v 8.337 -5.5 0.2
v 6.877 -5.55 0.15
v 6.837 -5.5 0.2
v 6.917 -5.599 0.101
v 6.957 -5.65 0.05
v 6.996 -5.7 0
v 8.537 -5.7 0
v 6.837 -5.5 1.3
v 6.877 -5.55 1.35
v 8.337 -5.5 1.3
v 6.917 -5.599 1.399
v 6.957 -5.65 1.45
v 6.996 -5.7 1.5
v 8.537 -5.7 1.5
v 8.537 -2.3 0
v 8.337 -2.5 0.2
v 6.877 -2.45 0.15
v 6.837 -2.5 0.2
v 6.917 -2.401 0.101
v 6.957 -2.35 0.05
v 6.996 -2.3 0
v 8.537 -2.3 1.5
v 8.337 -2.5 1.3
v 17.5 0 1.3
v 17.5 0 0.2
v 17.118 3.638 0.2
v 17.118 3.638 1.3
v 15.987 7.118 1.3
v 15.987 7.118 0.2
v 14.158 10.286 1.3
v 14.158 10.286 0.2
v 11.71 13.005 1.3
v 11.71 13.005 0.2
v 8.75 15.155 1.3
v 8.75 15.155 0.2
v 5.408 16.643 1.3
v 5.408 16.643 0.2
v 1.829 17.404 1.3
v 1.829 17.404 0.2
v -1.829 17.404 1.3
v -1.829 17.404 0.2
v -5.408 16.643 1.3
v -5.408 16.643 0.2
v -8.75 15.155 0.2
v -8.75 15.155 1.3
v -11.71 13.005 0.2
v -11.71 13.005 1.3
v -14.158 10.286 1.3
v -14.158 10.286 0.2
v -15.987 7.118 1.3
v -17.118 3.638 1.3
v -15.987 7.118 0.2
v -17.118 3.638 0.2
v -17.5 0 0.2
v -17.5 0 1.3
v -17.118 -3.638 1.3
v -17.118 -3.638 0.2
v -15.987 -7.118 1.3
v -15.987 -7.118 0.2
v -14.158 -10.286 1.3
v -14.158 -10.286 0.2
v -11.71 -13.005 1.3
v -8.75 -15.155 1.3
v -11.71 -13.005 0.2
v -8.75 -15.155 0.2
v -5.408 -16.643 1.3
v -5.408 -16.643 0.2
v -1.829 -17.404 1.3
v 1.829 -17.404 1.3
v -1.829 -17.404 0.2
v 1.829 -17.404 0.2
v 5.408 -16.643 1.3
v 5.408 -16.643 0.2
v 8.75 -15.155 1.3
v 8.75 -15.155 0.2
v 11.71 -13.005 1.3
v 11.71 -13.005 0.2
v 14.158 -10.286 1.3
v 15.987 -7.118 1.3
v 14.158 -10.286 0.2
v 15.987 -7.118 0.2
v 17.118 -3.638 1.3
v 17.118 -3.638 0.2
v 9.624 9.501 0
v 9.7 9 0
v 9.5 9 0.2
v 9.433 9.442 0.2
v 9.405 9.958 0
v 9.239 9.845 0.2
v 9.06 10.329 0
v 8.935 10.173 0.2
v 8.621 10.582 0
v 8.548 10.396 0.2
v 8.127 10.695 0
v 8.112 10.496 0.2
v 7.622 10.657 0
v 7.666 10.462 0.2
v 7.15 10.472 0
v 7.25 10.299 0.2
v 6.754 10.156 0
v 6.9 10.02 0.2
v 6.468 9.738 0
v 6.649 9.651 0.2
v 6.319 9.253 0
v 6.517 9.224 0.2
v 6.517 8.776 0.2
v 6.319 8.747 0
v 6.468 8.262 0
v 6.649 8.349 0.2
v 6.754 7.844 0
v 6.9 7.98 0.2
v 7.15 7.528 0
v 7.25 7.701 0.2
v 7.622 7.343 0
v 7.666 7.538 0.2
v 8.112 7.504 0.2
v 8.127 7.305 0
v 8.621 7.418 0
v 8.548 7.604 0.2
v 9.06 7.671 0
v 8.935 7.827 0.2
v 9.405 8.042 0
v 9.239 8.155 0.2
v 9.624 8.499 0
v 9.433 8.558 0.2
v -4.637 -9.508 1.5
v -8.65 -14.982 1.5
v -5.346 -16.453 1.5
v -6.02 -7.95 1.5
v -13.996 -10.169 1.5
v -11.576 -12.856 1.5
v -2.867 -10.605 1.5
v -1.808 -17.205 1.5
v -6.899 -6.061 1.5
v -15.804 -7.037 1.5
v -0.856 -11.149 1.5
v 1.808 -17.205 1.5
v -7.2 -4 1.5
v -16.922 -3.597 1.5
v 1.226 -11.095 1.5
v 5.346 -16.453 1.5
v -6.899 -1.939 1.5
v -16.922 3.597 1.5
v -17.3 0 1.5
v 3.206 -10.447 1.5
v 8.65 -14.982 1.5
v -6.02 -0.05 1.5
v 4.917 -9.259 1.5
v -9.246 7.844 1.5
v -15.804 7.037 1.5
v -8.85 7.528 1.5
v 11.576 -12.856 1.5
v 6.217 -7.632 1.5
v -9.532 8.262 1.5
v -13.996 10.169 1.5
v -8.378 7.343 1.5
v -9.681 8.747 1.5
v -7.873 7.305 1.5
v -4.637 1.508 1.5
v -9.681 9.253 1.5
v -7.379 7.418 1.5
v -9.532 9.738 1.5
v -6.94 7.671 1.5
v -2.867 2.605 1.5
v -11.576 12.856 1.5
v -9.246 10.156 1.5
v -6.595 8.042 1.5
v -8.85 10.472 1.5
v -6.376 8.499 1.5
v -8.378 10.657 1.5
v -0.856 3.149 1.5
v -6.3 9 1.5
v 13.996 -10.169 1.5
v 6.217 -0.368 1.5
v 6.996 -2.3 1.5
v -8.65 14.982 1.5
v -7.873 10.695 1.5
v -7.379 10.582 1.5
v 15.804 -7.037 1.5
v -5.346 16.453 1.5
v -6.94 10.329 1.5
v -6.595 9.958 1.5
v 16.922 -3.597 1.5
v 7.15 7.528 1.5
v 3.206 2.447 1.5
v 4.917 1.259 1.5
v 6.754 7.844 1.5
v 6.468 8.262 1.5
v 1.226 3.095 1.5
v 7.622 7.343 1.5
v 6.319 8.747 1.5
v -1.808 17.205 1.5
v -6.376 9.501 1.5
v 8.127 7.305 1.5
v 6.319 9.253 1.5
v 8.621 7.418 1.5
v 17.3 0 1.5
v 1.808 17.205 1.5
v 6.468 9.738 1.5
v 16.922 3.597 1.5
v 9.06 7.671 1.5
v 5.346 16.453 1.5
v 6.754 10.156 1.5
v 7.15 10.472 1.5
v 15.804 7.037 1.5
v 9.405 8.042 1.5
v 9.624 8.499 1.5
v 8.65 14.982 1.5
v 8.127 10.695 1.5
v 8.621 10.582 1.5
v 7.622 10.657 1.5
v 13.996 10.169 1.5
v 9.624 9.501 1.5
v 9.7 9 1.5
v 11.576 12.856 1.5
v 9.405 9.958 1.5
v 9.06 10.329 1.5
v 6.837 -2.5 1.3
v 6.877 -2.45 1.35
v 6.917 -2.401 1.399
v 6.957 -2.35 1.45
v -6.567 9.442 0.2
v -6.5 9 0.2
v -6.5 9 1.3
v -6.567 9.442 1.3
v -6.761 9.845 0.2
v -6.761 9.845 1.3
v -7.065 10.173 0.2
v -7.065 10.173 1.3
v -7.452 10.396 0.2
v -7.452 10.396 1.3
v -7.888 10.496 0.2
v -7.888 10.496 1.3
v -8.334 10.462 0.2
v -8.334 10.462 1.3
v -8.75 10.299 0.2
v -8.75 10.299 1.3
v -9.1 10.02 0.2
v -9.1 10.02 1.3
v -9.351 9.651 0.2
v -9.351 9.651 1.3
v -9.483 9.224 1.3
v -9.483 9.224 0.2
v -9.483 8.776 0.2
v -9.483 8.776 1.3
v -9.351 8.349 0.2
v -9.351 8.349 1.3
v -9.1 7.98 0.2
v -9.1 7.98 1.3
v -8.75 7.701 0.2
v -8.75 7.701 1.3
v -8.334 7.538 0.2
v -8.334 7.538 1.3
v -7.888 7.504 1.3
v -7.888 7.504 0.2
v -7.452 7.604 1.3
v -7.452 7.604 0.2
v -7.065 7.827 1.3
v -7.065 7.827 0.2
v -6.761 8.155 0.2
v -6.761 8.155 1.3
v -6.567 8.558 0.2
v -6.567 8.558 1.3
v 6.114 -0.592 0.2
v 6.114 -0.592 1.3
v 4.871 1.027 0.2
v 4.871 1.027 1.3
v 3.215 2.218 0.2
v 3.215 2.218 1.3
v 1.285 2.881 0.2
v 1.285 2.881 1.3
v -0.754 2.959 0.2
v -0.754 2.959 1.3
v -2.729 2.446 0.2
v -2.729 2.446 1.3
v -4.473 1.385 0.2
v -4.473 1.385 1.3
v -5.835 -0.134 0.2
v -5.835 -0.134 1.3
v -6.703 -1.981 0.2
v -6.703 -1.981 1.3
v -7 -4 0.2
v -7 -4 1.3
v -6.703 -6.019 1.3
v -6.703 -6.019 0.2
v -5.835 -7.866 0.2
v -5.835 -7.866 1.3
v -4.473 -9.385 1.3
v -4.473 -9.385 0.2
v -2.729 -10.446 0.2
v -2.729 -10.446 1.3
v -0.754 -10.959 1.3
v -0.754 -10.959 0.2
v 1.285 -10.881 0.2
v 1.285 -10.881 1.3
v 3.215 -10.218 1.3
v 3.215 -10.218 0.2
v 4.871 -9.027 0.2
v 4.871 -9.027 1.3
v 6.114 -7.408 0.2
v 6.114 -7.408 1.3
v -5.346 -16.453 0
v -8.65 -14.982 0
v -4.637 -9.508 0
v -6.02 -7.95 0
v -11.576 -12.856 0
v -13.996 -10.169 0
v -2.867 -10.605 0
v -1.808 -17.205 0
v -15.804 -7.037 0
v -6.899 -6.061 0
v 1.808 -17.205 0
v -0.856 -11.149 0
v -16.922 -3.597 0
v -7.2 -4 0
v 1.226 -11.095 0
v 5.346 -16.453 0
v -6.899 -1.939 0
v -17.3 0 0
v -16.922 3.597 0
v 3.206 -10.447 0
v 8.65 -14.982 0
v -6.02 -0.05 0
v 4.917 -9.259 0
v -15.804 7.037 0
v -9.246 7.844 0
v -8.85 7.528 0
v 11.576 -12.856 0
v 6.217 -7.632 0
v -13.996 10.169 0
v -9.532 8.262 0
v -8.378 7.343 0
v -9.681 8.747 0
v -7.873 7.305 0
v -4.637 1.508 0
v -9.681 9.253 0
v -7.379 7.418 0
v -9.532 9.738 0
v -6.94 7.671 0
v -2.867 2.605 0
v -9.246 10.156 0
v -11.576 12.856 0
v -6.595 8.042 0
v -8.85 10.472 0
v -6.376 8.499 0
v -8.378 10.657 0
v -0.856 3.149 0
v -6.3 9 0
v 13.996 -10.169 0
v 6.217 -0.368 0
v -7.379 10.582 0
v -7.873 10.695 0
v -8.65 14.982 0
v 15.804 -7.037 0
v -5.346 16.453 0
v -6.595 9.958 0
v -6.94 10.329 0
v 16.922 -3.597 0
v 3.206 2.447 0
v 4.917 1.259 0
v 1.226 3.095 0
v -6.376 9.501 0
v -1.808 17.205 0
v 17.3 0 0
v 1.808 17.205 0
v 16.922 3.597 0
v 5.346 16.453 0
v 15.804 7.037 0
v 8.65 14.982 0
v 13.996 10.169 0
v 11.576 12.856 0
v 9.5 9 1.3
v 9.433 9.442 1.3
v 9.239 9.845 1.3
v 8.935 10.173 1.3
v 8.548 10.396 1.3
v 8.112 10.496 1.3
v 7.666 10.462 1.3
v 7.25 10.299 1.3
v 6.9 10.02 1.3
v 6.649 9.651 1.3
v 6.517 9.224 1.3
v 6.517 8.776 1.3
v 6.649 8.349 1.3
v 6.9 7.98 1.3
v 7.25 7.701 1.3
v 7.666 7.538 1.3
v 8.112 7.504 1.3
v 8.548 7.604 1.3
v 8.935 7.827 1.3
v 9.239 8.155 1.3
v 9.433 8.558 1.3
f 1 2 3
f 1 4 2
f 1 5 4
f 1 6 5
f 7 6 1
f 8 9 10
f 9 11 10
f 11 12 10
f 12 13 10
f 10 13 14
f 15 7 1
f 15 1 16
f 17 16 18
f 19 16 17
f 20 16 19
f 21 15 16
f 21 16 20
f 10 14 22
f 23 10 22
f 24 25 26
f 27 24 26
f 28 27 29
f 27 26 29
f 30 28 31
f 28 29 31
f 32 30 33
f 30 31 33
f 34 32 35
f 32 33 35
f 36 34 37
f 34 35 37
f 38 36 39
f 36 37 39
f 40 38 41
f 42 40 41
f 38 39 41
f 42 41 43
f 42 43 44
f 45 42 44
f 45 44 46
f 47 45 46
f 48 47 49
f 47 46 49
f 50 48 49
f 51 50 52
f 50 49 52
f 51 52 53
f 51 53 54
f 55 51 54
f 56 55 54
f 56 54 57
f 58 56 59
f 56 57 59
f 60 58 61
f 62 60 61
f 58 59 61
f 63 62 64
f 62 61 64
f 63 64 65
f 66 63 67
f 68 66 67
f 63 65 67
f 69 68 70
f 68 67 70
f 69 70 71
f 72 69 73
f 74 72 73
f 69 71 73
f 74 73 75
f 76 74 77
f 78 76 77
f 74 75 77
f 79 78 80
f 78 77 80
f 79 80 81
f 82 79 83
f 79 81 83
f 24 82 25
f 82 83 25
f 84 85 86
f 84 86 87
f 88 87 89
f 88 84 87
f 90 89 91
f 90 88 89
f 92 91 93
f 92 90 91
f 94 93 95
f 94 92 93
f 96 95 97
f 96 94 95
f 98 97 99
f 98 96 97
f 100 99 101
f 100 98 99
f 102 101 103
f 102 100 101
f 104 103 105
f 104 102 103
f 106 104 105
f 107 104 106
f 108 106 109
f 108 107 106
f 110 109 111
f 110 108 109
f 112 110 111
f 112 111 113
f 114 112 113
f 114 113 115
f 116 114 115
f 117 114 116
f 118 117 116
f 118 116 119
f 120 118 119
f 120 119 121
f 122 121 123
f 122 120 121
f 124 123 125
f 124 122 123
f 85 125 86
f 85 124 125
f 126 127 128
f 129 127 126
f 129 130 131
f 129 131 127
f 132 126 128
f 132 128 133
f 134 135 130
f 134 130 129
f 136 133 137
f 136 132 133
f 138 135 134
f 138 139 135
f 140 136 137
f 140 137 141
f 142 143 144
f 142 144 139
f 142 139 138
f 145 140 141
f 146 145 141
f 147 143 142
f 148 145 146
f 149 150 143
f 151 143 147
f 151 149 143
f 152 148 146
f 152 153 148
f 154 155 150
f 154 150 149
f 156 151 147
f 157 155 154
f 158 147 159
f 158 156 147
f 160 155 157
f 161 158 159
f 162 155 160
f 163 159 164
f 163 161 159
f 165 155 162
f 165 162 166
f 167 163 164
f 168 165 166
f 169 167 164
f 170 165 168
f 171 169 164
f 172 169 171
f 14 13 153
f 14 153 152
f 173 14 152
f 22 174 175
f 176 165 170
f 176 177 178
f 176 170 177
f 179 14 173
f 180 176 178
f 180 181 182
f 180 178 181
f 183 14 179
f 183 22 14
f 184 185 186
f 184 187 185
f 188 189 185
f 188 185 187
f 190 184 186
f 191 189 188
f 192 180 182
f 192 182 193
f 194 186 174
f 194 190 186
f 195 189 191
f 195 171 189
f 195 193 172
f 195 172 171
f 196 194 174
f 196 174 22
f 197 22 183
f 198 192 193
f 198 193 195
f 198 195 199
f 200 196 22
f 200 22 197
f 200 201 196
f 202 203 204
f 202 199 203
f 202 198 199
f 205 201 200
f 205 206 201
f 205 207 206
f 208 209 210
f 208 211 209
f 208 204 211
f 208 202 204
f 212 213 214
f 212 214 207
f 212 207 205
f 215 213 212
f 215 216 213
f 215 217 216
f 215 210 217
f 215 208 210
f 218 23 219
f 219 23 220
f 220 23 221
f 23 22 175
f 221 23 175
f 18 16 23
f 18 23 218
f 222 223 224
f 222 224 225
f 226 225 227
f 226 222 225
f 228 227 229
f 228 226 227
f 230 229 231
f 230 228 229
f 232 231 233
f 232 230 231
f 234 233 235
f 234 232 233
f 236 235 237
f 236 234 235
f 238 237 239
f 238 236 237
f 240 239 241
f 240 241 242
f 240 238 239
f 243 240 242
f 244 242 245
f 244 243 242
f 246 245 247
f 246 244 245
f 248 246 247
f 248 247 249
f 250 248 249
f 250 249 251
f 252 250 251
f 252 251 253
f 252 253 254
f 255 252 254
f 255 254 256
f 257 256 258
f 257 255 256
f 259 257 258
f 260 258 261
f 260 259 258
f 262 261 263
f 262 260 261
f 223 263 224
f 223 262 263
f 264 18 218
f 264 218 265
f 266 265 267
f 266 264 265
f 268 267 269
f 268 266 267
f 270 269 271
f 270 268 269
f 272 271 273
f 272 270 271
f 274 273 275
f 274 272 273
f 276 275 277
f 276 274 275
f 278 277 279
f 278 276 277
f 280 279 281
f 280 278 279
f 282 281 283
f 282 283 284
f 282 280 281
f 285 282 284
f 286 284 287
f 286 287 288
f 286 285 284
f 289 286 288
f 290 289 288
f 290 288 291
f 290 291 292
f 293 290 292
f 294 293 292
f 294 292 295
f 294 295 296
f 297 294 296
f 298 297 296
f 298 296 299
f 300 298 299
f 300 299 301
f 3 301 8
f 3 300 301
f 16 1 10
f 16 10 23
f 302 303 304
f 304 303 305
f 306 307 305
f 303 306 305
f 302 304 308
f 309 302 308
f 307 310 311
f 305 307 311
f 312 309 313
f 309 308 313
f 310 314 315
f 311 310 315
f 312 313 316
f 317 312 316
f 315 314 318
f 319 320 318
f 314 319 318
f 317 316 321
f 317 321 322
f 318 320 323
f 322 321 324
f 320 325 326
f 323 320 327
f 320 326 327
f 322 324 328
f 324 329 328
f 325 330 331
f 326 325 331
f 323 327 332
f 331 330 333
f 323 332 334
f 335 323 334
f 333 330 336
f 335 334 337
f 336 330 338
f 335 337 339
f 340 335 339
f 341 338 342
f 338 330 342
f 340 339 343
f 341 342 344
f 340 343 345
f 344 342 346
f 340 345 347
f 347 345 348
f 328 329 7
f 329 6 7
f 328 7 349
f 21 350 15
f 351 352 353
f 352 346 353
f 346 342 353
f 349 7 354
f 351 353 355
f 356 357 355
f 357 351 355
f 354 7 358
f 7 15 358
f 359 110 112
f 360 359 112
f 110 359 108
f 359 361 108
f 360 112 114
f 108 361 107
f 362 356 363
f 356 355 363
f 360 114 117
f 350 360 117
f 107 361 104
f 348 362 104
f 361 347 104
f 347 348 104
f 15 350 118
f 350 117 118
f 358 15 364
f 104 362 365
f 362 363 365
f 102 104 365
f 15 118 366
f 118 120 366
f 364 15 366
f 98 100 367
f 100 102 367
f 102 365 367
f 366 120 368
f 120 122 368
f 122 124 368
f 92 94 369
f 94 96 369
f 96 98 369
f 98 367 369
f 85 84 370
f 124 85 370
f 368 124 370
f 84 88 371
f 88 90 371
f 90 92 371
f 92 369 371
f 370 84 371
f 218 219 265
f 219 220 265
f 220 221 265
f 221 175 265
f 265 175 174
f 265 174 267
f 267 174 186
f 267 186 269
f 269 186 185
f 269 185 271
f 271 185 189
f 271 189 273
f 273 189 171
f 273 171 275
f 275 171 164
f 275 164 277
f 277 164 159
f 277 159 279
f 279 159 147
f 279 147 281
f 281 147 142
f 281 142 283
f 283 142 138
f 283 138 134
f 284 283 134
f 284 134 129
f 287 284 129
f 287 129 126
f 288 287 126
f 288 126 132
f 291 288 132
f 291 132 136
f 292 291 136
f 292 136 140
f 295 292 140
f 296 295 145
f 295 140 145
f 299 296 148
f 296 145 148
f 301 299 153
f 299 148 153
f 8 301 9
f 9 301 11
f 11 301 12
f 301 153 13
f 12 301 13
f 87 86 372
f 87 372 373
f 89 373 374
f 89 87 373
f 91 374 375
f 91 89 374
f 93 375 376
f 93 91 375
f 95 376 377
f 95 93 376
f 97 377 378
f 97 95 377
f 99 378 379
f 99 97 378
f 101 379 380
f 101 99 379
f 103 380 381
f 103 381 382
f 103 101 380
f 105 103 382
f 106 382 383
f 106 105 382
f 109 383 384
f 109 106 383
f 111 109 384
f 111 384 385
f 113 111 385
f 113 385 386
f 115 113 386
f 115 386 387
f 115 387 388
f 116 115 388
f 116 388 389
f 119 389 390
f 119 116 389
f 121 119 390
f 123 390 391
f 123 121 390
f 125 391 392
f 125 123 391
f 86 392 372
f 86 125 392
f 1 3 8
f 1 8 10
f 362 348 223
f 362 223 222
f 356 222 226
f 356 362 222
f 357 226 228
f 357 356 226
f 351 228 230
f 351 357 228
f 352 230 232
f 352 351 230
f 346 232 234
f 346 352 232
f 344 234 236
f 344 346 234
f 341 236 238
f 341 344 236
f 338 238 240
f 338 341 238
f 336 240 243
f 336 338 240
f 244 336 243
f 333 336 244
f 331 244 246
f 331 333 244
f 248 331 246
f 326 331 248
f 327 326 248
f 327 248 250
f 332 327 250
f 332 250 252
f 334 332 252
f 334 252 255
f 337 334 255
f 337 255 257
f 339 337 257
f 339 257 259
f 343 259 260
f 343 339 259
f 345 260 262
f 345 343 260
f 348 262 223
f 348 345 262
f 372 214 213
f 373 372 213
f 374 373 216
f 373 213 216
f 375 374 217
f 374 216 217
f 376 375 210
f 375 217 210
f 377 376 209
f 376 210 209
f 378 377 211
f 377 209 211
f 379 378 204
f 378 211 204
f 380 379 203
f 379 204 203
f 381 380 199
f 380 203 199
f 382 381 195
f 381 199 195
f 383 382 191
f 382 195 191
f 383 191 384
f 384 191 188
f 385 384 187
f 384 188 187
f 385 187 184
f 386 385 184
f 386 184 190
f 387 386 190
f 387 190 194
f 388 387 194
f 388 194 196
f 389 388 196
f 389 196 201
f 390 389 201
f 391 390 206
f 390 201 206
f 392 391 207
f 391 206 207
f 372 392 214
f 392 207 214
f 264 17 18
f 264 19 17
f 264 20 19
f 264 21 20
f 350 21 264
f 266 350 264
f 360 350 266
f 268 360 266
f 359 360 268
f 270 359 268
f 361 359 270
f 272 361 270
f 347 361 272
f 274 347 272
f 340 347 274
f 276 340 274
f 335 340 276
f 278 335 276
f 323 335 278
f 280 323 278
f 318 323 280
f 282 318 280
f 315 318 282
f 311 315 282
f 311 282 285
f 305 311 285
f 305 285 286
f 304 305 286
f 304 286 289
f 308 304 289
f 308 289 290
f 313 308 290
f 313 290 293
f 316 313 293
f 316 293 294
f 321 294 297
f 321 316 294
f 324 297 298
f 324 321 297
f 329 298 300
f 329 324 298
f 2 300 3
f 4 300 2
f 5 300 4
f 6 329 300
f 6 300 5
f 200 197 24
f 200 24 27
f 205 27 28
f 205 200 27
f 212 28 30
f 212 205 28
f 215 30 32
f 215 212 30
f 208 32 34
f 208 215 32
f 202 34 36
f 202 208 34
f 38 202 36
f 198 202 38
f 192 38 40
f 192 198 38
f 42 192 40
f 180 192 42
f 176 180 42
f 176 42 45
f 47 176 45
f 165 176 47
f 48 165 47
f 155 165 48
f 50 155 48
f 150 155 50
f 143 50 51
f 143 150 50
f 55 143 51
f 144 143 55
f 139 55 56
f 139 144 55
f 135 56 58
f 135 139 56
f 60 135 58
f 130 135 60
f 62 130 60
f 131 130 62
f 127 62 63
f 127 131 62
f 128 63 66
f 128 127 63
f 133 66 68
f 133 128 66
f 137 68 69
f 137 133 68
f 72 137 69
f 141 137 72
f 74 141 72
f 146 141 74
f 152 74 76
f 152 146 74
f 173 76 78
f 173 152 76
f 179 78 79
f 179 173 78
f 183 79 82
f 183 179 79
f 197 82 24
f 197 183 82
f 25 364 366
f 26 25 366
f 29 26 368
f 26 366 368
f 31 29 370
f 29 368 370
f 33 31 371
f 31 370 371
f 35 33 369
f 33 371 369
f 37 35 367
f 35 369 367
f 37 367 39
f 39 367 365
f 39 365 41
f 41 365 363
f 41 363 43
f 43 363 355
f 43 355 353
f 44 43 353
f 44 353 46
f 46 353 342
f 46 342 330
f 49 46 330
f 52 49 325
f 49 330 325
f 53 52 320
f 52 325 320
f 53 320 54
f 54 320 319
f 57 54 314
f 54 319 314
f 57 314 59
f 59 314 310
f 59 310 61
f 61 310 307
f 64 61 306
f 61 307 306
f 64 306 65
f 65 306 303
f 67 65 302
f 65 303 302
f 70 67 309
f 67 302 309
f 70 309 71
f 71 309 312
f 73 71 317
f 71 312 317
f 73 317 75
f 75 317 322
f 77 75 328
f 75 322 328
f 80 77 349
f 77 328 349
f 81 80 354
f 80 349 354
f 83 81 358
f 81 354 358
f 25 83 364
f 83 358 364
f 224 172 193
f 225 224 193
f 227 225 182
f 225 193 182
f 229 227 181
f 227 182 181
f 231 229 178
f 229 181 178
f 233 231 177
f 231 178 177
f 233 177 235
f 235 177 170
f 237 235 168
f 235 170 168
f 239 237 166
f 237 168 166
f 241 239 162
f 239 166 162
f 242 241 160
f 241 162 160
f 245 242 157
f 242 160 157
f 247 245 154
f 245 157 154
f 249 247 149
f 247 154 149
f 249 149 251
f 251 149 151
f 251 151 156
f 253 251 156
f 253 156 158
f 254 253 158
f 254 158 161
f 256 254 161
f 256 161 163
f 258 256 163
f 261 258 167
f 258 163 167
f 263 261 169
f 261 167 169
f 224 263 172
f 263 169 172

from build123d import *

# Parameters (mm, degrees)
SKETCH1_R           = 17.5
SKETCH1_R_2         = 1.5
BOSS_EXTRUDE1_DEPTH = 1.5
CHAMFER1_SIZE       = 0.2


with BuildPart() as part:
    # Sketch1 → Boss-Extrude1 (new body)
    with BuildSketch(Plane.XY):
        Circle(SKETCH1_R)
        with Locations((-8, 9)):
            Circle(SKETCH1_R_2, mode=Mode.SUBTRACT)
        with Locations((8, 9)):
            Circle(SKETCH1_R_2, mode=Mode.SUBTRACT)
        with BuildLine():
            Line((8.337397166, -2.5), (6.837397166, -2.5))
            ThreePointArc((6.837397166, -2.5), (-7, -4), (6.837397166, -5.5))
            Line((6.837397166, -5.5), (8.337397166, -5.5))
            Line((8.337397166, -5.5), (8.337397166, -2.5))
        make_face(mode=Mode.SUBTRACT)
    extrude(amount=BOSS_EXTRUDE1_DEPTH)

    # Chamfer1
    chamfer1_edges = [part.edges().sort_by_distance(p)[0] for p in [
        (-7, -4, 1.5),
        (7.587397166, -5.5, 1.5),
        (6.5, 9, 0),
        (6.5, 9, 1.5),
        (-17.5, 0, 0),
        (-9.5, 9, 0),
        (-9.5, 9, 1.5),
        (-17.5, 0, 1.5),
        (8.337397166, -4, 0),
        (7.587397166, -2.5, 0),
        (-7, -4, 0),
        (7.587397166, -5.5, 0),
        (8.337397166, -4, 1.5),
        (7.587397166, -2.5, 1.5),
    ]]
    chamfer(chamfer1_edges, length=CHAMFER1_SIZE)


solid = part.part
